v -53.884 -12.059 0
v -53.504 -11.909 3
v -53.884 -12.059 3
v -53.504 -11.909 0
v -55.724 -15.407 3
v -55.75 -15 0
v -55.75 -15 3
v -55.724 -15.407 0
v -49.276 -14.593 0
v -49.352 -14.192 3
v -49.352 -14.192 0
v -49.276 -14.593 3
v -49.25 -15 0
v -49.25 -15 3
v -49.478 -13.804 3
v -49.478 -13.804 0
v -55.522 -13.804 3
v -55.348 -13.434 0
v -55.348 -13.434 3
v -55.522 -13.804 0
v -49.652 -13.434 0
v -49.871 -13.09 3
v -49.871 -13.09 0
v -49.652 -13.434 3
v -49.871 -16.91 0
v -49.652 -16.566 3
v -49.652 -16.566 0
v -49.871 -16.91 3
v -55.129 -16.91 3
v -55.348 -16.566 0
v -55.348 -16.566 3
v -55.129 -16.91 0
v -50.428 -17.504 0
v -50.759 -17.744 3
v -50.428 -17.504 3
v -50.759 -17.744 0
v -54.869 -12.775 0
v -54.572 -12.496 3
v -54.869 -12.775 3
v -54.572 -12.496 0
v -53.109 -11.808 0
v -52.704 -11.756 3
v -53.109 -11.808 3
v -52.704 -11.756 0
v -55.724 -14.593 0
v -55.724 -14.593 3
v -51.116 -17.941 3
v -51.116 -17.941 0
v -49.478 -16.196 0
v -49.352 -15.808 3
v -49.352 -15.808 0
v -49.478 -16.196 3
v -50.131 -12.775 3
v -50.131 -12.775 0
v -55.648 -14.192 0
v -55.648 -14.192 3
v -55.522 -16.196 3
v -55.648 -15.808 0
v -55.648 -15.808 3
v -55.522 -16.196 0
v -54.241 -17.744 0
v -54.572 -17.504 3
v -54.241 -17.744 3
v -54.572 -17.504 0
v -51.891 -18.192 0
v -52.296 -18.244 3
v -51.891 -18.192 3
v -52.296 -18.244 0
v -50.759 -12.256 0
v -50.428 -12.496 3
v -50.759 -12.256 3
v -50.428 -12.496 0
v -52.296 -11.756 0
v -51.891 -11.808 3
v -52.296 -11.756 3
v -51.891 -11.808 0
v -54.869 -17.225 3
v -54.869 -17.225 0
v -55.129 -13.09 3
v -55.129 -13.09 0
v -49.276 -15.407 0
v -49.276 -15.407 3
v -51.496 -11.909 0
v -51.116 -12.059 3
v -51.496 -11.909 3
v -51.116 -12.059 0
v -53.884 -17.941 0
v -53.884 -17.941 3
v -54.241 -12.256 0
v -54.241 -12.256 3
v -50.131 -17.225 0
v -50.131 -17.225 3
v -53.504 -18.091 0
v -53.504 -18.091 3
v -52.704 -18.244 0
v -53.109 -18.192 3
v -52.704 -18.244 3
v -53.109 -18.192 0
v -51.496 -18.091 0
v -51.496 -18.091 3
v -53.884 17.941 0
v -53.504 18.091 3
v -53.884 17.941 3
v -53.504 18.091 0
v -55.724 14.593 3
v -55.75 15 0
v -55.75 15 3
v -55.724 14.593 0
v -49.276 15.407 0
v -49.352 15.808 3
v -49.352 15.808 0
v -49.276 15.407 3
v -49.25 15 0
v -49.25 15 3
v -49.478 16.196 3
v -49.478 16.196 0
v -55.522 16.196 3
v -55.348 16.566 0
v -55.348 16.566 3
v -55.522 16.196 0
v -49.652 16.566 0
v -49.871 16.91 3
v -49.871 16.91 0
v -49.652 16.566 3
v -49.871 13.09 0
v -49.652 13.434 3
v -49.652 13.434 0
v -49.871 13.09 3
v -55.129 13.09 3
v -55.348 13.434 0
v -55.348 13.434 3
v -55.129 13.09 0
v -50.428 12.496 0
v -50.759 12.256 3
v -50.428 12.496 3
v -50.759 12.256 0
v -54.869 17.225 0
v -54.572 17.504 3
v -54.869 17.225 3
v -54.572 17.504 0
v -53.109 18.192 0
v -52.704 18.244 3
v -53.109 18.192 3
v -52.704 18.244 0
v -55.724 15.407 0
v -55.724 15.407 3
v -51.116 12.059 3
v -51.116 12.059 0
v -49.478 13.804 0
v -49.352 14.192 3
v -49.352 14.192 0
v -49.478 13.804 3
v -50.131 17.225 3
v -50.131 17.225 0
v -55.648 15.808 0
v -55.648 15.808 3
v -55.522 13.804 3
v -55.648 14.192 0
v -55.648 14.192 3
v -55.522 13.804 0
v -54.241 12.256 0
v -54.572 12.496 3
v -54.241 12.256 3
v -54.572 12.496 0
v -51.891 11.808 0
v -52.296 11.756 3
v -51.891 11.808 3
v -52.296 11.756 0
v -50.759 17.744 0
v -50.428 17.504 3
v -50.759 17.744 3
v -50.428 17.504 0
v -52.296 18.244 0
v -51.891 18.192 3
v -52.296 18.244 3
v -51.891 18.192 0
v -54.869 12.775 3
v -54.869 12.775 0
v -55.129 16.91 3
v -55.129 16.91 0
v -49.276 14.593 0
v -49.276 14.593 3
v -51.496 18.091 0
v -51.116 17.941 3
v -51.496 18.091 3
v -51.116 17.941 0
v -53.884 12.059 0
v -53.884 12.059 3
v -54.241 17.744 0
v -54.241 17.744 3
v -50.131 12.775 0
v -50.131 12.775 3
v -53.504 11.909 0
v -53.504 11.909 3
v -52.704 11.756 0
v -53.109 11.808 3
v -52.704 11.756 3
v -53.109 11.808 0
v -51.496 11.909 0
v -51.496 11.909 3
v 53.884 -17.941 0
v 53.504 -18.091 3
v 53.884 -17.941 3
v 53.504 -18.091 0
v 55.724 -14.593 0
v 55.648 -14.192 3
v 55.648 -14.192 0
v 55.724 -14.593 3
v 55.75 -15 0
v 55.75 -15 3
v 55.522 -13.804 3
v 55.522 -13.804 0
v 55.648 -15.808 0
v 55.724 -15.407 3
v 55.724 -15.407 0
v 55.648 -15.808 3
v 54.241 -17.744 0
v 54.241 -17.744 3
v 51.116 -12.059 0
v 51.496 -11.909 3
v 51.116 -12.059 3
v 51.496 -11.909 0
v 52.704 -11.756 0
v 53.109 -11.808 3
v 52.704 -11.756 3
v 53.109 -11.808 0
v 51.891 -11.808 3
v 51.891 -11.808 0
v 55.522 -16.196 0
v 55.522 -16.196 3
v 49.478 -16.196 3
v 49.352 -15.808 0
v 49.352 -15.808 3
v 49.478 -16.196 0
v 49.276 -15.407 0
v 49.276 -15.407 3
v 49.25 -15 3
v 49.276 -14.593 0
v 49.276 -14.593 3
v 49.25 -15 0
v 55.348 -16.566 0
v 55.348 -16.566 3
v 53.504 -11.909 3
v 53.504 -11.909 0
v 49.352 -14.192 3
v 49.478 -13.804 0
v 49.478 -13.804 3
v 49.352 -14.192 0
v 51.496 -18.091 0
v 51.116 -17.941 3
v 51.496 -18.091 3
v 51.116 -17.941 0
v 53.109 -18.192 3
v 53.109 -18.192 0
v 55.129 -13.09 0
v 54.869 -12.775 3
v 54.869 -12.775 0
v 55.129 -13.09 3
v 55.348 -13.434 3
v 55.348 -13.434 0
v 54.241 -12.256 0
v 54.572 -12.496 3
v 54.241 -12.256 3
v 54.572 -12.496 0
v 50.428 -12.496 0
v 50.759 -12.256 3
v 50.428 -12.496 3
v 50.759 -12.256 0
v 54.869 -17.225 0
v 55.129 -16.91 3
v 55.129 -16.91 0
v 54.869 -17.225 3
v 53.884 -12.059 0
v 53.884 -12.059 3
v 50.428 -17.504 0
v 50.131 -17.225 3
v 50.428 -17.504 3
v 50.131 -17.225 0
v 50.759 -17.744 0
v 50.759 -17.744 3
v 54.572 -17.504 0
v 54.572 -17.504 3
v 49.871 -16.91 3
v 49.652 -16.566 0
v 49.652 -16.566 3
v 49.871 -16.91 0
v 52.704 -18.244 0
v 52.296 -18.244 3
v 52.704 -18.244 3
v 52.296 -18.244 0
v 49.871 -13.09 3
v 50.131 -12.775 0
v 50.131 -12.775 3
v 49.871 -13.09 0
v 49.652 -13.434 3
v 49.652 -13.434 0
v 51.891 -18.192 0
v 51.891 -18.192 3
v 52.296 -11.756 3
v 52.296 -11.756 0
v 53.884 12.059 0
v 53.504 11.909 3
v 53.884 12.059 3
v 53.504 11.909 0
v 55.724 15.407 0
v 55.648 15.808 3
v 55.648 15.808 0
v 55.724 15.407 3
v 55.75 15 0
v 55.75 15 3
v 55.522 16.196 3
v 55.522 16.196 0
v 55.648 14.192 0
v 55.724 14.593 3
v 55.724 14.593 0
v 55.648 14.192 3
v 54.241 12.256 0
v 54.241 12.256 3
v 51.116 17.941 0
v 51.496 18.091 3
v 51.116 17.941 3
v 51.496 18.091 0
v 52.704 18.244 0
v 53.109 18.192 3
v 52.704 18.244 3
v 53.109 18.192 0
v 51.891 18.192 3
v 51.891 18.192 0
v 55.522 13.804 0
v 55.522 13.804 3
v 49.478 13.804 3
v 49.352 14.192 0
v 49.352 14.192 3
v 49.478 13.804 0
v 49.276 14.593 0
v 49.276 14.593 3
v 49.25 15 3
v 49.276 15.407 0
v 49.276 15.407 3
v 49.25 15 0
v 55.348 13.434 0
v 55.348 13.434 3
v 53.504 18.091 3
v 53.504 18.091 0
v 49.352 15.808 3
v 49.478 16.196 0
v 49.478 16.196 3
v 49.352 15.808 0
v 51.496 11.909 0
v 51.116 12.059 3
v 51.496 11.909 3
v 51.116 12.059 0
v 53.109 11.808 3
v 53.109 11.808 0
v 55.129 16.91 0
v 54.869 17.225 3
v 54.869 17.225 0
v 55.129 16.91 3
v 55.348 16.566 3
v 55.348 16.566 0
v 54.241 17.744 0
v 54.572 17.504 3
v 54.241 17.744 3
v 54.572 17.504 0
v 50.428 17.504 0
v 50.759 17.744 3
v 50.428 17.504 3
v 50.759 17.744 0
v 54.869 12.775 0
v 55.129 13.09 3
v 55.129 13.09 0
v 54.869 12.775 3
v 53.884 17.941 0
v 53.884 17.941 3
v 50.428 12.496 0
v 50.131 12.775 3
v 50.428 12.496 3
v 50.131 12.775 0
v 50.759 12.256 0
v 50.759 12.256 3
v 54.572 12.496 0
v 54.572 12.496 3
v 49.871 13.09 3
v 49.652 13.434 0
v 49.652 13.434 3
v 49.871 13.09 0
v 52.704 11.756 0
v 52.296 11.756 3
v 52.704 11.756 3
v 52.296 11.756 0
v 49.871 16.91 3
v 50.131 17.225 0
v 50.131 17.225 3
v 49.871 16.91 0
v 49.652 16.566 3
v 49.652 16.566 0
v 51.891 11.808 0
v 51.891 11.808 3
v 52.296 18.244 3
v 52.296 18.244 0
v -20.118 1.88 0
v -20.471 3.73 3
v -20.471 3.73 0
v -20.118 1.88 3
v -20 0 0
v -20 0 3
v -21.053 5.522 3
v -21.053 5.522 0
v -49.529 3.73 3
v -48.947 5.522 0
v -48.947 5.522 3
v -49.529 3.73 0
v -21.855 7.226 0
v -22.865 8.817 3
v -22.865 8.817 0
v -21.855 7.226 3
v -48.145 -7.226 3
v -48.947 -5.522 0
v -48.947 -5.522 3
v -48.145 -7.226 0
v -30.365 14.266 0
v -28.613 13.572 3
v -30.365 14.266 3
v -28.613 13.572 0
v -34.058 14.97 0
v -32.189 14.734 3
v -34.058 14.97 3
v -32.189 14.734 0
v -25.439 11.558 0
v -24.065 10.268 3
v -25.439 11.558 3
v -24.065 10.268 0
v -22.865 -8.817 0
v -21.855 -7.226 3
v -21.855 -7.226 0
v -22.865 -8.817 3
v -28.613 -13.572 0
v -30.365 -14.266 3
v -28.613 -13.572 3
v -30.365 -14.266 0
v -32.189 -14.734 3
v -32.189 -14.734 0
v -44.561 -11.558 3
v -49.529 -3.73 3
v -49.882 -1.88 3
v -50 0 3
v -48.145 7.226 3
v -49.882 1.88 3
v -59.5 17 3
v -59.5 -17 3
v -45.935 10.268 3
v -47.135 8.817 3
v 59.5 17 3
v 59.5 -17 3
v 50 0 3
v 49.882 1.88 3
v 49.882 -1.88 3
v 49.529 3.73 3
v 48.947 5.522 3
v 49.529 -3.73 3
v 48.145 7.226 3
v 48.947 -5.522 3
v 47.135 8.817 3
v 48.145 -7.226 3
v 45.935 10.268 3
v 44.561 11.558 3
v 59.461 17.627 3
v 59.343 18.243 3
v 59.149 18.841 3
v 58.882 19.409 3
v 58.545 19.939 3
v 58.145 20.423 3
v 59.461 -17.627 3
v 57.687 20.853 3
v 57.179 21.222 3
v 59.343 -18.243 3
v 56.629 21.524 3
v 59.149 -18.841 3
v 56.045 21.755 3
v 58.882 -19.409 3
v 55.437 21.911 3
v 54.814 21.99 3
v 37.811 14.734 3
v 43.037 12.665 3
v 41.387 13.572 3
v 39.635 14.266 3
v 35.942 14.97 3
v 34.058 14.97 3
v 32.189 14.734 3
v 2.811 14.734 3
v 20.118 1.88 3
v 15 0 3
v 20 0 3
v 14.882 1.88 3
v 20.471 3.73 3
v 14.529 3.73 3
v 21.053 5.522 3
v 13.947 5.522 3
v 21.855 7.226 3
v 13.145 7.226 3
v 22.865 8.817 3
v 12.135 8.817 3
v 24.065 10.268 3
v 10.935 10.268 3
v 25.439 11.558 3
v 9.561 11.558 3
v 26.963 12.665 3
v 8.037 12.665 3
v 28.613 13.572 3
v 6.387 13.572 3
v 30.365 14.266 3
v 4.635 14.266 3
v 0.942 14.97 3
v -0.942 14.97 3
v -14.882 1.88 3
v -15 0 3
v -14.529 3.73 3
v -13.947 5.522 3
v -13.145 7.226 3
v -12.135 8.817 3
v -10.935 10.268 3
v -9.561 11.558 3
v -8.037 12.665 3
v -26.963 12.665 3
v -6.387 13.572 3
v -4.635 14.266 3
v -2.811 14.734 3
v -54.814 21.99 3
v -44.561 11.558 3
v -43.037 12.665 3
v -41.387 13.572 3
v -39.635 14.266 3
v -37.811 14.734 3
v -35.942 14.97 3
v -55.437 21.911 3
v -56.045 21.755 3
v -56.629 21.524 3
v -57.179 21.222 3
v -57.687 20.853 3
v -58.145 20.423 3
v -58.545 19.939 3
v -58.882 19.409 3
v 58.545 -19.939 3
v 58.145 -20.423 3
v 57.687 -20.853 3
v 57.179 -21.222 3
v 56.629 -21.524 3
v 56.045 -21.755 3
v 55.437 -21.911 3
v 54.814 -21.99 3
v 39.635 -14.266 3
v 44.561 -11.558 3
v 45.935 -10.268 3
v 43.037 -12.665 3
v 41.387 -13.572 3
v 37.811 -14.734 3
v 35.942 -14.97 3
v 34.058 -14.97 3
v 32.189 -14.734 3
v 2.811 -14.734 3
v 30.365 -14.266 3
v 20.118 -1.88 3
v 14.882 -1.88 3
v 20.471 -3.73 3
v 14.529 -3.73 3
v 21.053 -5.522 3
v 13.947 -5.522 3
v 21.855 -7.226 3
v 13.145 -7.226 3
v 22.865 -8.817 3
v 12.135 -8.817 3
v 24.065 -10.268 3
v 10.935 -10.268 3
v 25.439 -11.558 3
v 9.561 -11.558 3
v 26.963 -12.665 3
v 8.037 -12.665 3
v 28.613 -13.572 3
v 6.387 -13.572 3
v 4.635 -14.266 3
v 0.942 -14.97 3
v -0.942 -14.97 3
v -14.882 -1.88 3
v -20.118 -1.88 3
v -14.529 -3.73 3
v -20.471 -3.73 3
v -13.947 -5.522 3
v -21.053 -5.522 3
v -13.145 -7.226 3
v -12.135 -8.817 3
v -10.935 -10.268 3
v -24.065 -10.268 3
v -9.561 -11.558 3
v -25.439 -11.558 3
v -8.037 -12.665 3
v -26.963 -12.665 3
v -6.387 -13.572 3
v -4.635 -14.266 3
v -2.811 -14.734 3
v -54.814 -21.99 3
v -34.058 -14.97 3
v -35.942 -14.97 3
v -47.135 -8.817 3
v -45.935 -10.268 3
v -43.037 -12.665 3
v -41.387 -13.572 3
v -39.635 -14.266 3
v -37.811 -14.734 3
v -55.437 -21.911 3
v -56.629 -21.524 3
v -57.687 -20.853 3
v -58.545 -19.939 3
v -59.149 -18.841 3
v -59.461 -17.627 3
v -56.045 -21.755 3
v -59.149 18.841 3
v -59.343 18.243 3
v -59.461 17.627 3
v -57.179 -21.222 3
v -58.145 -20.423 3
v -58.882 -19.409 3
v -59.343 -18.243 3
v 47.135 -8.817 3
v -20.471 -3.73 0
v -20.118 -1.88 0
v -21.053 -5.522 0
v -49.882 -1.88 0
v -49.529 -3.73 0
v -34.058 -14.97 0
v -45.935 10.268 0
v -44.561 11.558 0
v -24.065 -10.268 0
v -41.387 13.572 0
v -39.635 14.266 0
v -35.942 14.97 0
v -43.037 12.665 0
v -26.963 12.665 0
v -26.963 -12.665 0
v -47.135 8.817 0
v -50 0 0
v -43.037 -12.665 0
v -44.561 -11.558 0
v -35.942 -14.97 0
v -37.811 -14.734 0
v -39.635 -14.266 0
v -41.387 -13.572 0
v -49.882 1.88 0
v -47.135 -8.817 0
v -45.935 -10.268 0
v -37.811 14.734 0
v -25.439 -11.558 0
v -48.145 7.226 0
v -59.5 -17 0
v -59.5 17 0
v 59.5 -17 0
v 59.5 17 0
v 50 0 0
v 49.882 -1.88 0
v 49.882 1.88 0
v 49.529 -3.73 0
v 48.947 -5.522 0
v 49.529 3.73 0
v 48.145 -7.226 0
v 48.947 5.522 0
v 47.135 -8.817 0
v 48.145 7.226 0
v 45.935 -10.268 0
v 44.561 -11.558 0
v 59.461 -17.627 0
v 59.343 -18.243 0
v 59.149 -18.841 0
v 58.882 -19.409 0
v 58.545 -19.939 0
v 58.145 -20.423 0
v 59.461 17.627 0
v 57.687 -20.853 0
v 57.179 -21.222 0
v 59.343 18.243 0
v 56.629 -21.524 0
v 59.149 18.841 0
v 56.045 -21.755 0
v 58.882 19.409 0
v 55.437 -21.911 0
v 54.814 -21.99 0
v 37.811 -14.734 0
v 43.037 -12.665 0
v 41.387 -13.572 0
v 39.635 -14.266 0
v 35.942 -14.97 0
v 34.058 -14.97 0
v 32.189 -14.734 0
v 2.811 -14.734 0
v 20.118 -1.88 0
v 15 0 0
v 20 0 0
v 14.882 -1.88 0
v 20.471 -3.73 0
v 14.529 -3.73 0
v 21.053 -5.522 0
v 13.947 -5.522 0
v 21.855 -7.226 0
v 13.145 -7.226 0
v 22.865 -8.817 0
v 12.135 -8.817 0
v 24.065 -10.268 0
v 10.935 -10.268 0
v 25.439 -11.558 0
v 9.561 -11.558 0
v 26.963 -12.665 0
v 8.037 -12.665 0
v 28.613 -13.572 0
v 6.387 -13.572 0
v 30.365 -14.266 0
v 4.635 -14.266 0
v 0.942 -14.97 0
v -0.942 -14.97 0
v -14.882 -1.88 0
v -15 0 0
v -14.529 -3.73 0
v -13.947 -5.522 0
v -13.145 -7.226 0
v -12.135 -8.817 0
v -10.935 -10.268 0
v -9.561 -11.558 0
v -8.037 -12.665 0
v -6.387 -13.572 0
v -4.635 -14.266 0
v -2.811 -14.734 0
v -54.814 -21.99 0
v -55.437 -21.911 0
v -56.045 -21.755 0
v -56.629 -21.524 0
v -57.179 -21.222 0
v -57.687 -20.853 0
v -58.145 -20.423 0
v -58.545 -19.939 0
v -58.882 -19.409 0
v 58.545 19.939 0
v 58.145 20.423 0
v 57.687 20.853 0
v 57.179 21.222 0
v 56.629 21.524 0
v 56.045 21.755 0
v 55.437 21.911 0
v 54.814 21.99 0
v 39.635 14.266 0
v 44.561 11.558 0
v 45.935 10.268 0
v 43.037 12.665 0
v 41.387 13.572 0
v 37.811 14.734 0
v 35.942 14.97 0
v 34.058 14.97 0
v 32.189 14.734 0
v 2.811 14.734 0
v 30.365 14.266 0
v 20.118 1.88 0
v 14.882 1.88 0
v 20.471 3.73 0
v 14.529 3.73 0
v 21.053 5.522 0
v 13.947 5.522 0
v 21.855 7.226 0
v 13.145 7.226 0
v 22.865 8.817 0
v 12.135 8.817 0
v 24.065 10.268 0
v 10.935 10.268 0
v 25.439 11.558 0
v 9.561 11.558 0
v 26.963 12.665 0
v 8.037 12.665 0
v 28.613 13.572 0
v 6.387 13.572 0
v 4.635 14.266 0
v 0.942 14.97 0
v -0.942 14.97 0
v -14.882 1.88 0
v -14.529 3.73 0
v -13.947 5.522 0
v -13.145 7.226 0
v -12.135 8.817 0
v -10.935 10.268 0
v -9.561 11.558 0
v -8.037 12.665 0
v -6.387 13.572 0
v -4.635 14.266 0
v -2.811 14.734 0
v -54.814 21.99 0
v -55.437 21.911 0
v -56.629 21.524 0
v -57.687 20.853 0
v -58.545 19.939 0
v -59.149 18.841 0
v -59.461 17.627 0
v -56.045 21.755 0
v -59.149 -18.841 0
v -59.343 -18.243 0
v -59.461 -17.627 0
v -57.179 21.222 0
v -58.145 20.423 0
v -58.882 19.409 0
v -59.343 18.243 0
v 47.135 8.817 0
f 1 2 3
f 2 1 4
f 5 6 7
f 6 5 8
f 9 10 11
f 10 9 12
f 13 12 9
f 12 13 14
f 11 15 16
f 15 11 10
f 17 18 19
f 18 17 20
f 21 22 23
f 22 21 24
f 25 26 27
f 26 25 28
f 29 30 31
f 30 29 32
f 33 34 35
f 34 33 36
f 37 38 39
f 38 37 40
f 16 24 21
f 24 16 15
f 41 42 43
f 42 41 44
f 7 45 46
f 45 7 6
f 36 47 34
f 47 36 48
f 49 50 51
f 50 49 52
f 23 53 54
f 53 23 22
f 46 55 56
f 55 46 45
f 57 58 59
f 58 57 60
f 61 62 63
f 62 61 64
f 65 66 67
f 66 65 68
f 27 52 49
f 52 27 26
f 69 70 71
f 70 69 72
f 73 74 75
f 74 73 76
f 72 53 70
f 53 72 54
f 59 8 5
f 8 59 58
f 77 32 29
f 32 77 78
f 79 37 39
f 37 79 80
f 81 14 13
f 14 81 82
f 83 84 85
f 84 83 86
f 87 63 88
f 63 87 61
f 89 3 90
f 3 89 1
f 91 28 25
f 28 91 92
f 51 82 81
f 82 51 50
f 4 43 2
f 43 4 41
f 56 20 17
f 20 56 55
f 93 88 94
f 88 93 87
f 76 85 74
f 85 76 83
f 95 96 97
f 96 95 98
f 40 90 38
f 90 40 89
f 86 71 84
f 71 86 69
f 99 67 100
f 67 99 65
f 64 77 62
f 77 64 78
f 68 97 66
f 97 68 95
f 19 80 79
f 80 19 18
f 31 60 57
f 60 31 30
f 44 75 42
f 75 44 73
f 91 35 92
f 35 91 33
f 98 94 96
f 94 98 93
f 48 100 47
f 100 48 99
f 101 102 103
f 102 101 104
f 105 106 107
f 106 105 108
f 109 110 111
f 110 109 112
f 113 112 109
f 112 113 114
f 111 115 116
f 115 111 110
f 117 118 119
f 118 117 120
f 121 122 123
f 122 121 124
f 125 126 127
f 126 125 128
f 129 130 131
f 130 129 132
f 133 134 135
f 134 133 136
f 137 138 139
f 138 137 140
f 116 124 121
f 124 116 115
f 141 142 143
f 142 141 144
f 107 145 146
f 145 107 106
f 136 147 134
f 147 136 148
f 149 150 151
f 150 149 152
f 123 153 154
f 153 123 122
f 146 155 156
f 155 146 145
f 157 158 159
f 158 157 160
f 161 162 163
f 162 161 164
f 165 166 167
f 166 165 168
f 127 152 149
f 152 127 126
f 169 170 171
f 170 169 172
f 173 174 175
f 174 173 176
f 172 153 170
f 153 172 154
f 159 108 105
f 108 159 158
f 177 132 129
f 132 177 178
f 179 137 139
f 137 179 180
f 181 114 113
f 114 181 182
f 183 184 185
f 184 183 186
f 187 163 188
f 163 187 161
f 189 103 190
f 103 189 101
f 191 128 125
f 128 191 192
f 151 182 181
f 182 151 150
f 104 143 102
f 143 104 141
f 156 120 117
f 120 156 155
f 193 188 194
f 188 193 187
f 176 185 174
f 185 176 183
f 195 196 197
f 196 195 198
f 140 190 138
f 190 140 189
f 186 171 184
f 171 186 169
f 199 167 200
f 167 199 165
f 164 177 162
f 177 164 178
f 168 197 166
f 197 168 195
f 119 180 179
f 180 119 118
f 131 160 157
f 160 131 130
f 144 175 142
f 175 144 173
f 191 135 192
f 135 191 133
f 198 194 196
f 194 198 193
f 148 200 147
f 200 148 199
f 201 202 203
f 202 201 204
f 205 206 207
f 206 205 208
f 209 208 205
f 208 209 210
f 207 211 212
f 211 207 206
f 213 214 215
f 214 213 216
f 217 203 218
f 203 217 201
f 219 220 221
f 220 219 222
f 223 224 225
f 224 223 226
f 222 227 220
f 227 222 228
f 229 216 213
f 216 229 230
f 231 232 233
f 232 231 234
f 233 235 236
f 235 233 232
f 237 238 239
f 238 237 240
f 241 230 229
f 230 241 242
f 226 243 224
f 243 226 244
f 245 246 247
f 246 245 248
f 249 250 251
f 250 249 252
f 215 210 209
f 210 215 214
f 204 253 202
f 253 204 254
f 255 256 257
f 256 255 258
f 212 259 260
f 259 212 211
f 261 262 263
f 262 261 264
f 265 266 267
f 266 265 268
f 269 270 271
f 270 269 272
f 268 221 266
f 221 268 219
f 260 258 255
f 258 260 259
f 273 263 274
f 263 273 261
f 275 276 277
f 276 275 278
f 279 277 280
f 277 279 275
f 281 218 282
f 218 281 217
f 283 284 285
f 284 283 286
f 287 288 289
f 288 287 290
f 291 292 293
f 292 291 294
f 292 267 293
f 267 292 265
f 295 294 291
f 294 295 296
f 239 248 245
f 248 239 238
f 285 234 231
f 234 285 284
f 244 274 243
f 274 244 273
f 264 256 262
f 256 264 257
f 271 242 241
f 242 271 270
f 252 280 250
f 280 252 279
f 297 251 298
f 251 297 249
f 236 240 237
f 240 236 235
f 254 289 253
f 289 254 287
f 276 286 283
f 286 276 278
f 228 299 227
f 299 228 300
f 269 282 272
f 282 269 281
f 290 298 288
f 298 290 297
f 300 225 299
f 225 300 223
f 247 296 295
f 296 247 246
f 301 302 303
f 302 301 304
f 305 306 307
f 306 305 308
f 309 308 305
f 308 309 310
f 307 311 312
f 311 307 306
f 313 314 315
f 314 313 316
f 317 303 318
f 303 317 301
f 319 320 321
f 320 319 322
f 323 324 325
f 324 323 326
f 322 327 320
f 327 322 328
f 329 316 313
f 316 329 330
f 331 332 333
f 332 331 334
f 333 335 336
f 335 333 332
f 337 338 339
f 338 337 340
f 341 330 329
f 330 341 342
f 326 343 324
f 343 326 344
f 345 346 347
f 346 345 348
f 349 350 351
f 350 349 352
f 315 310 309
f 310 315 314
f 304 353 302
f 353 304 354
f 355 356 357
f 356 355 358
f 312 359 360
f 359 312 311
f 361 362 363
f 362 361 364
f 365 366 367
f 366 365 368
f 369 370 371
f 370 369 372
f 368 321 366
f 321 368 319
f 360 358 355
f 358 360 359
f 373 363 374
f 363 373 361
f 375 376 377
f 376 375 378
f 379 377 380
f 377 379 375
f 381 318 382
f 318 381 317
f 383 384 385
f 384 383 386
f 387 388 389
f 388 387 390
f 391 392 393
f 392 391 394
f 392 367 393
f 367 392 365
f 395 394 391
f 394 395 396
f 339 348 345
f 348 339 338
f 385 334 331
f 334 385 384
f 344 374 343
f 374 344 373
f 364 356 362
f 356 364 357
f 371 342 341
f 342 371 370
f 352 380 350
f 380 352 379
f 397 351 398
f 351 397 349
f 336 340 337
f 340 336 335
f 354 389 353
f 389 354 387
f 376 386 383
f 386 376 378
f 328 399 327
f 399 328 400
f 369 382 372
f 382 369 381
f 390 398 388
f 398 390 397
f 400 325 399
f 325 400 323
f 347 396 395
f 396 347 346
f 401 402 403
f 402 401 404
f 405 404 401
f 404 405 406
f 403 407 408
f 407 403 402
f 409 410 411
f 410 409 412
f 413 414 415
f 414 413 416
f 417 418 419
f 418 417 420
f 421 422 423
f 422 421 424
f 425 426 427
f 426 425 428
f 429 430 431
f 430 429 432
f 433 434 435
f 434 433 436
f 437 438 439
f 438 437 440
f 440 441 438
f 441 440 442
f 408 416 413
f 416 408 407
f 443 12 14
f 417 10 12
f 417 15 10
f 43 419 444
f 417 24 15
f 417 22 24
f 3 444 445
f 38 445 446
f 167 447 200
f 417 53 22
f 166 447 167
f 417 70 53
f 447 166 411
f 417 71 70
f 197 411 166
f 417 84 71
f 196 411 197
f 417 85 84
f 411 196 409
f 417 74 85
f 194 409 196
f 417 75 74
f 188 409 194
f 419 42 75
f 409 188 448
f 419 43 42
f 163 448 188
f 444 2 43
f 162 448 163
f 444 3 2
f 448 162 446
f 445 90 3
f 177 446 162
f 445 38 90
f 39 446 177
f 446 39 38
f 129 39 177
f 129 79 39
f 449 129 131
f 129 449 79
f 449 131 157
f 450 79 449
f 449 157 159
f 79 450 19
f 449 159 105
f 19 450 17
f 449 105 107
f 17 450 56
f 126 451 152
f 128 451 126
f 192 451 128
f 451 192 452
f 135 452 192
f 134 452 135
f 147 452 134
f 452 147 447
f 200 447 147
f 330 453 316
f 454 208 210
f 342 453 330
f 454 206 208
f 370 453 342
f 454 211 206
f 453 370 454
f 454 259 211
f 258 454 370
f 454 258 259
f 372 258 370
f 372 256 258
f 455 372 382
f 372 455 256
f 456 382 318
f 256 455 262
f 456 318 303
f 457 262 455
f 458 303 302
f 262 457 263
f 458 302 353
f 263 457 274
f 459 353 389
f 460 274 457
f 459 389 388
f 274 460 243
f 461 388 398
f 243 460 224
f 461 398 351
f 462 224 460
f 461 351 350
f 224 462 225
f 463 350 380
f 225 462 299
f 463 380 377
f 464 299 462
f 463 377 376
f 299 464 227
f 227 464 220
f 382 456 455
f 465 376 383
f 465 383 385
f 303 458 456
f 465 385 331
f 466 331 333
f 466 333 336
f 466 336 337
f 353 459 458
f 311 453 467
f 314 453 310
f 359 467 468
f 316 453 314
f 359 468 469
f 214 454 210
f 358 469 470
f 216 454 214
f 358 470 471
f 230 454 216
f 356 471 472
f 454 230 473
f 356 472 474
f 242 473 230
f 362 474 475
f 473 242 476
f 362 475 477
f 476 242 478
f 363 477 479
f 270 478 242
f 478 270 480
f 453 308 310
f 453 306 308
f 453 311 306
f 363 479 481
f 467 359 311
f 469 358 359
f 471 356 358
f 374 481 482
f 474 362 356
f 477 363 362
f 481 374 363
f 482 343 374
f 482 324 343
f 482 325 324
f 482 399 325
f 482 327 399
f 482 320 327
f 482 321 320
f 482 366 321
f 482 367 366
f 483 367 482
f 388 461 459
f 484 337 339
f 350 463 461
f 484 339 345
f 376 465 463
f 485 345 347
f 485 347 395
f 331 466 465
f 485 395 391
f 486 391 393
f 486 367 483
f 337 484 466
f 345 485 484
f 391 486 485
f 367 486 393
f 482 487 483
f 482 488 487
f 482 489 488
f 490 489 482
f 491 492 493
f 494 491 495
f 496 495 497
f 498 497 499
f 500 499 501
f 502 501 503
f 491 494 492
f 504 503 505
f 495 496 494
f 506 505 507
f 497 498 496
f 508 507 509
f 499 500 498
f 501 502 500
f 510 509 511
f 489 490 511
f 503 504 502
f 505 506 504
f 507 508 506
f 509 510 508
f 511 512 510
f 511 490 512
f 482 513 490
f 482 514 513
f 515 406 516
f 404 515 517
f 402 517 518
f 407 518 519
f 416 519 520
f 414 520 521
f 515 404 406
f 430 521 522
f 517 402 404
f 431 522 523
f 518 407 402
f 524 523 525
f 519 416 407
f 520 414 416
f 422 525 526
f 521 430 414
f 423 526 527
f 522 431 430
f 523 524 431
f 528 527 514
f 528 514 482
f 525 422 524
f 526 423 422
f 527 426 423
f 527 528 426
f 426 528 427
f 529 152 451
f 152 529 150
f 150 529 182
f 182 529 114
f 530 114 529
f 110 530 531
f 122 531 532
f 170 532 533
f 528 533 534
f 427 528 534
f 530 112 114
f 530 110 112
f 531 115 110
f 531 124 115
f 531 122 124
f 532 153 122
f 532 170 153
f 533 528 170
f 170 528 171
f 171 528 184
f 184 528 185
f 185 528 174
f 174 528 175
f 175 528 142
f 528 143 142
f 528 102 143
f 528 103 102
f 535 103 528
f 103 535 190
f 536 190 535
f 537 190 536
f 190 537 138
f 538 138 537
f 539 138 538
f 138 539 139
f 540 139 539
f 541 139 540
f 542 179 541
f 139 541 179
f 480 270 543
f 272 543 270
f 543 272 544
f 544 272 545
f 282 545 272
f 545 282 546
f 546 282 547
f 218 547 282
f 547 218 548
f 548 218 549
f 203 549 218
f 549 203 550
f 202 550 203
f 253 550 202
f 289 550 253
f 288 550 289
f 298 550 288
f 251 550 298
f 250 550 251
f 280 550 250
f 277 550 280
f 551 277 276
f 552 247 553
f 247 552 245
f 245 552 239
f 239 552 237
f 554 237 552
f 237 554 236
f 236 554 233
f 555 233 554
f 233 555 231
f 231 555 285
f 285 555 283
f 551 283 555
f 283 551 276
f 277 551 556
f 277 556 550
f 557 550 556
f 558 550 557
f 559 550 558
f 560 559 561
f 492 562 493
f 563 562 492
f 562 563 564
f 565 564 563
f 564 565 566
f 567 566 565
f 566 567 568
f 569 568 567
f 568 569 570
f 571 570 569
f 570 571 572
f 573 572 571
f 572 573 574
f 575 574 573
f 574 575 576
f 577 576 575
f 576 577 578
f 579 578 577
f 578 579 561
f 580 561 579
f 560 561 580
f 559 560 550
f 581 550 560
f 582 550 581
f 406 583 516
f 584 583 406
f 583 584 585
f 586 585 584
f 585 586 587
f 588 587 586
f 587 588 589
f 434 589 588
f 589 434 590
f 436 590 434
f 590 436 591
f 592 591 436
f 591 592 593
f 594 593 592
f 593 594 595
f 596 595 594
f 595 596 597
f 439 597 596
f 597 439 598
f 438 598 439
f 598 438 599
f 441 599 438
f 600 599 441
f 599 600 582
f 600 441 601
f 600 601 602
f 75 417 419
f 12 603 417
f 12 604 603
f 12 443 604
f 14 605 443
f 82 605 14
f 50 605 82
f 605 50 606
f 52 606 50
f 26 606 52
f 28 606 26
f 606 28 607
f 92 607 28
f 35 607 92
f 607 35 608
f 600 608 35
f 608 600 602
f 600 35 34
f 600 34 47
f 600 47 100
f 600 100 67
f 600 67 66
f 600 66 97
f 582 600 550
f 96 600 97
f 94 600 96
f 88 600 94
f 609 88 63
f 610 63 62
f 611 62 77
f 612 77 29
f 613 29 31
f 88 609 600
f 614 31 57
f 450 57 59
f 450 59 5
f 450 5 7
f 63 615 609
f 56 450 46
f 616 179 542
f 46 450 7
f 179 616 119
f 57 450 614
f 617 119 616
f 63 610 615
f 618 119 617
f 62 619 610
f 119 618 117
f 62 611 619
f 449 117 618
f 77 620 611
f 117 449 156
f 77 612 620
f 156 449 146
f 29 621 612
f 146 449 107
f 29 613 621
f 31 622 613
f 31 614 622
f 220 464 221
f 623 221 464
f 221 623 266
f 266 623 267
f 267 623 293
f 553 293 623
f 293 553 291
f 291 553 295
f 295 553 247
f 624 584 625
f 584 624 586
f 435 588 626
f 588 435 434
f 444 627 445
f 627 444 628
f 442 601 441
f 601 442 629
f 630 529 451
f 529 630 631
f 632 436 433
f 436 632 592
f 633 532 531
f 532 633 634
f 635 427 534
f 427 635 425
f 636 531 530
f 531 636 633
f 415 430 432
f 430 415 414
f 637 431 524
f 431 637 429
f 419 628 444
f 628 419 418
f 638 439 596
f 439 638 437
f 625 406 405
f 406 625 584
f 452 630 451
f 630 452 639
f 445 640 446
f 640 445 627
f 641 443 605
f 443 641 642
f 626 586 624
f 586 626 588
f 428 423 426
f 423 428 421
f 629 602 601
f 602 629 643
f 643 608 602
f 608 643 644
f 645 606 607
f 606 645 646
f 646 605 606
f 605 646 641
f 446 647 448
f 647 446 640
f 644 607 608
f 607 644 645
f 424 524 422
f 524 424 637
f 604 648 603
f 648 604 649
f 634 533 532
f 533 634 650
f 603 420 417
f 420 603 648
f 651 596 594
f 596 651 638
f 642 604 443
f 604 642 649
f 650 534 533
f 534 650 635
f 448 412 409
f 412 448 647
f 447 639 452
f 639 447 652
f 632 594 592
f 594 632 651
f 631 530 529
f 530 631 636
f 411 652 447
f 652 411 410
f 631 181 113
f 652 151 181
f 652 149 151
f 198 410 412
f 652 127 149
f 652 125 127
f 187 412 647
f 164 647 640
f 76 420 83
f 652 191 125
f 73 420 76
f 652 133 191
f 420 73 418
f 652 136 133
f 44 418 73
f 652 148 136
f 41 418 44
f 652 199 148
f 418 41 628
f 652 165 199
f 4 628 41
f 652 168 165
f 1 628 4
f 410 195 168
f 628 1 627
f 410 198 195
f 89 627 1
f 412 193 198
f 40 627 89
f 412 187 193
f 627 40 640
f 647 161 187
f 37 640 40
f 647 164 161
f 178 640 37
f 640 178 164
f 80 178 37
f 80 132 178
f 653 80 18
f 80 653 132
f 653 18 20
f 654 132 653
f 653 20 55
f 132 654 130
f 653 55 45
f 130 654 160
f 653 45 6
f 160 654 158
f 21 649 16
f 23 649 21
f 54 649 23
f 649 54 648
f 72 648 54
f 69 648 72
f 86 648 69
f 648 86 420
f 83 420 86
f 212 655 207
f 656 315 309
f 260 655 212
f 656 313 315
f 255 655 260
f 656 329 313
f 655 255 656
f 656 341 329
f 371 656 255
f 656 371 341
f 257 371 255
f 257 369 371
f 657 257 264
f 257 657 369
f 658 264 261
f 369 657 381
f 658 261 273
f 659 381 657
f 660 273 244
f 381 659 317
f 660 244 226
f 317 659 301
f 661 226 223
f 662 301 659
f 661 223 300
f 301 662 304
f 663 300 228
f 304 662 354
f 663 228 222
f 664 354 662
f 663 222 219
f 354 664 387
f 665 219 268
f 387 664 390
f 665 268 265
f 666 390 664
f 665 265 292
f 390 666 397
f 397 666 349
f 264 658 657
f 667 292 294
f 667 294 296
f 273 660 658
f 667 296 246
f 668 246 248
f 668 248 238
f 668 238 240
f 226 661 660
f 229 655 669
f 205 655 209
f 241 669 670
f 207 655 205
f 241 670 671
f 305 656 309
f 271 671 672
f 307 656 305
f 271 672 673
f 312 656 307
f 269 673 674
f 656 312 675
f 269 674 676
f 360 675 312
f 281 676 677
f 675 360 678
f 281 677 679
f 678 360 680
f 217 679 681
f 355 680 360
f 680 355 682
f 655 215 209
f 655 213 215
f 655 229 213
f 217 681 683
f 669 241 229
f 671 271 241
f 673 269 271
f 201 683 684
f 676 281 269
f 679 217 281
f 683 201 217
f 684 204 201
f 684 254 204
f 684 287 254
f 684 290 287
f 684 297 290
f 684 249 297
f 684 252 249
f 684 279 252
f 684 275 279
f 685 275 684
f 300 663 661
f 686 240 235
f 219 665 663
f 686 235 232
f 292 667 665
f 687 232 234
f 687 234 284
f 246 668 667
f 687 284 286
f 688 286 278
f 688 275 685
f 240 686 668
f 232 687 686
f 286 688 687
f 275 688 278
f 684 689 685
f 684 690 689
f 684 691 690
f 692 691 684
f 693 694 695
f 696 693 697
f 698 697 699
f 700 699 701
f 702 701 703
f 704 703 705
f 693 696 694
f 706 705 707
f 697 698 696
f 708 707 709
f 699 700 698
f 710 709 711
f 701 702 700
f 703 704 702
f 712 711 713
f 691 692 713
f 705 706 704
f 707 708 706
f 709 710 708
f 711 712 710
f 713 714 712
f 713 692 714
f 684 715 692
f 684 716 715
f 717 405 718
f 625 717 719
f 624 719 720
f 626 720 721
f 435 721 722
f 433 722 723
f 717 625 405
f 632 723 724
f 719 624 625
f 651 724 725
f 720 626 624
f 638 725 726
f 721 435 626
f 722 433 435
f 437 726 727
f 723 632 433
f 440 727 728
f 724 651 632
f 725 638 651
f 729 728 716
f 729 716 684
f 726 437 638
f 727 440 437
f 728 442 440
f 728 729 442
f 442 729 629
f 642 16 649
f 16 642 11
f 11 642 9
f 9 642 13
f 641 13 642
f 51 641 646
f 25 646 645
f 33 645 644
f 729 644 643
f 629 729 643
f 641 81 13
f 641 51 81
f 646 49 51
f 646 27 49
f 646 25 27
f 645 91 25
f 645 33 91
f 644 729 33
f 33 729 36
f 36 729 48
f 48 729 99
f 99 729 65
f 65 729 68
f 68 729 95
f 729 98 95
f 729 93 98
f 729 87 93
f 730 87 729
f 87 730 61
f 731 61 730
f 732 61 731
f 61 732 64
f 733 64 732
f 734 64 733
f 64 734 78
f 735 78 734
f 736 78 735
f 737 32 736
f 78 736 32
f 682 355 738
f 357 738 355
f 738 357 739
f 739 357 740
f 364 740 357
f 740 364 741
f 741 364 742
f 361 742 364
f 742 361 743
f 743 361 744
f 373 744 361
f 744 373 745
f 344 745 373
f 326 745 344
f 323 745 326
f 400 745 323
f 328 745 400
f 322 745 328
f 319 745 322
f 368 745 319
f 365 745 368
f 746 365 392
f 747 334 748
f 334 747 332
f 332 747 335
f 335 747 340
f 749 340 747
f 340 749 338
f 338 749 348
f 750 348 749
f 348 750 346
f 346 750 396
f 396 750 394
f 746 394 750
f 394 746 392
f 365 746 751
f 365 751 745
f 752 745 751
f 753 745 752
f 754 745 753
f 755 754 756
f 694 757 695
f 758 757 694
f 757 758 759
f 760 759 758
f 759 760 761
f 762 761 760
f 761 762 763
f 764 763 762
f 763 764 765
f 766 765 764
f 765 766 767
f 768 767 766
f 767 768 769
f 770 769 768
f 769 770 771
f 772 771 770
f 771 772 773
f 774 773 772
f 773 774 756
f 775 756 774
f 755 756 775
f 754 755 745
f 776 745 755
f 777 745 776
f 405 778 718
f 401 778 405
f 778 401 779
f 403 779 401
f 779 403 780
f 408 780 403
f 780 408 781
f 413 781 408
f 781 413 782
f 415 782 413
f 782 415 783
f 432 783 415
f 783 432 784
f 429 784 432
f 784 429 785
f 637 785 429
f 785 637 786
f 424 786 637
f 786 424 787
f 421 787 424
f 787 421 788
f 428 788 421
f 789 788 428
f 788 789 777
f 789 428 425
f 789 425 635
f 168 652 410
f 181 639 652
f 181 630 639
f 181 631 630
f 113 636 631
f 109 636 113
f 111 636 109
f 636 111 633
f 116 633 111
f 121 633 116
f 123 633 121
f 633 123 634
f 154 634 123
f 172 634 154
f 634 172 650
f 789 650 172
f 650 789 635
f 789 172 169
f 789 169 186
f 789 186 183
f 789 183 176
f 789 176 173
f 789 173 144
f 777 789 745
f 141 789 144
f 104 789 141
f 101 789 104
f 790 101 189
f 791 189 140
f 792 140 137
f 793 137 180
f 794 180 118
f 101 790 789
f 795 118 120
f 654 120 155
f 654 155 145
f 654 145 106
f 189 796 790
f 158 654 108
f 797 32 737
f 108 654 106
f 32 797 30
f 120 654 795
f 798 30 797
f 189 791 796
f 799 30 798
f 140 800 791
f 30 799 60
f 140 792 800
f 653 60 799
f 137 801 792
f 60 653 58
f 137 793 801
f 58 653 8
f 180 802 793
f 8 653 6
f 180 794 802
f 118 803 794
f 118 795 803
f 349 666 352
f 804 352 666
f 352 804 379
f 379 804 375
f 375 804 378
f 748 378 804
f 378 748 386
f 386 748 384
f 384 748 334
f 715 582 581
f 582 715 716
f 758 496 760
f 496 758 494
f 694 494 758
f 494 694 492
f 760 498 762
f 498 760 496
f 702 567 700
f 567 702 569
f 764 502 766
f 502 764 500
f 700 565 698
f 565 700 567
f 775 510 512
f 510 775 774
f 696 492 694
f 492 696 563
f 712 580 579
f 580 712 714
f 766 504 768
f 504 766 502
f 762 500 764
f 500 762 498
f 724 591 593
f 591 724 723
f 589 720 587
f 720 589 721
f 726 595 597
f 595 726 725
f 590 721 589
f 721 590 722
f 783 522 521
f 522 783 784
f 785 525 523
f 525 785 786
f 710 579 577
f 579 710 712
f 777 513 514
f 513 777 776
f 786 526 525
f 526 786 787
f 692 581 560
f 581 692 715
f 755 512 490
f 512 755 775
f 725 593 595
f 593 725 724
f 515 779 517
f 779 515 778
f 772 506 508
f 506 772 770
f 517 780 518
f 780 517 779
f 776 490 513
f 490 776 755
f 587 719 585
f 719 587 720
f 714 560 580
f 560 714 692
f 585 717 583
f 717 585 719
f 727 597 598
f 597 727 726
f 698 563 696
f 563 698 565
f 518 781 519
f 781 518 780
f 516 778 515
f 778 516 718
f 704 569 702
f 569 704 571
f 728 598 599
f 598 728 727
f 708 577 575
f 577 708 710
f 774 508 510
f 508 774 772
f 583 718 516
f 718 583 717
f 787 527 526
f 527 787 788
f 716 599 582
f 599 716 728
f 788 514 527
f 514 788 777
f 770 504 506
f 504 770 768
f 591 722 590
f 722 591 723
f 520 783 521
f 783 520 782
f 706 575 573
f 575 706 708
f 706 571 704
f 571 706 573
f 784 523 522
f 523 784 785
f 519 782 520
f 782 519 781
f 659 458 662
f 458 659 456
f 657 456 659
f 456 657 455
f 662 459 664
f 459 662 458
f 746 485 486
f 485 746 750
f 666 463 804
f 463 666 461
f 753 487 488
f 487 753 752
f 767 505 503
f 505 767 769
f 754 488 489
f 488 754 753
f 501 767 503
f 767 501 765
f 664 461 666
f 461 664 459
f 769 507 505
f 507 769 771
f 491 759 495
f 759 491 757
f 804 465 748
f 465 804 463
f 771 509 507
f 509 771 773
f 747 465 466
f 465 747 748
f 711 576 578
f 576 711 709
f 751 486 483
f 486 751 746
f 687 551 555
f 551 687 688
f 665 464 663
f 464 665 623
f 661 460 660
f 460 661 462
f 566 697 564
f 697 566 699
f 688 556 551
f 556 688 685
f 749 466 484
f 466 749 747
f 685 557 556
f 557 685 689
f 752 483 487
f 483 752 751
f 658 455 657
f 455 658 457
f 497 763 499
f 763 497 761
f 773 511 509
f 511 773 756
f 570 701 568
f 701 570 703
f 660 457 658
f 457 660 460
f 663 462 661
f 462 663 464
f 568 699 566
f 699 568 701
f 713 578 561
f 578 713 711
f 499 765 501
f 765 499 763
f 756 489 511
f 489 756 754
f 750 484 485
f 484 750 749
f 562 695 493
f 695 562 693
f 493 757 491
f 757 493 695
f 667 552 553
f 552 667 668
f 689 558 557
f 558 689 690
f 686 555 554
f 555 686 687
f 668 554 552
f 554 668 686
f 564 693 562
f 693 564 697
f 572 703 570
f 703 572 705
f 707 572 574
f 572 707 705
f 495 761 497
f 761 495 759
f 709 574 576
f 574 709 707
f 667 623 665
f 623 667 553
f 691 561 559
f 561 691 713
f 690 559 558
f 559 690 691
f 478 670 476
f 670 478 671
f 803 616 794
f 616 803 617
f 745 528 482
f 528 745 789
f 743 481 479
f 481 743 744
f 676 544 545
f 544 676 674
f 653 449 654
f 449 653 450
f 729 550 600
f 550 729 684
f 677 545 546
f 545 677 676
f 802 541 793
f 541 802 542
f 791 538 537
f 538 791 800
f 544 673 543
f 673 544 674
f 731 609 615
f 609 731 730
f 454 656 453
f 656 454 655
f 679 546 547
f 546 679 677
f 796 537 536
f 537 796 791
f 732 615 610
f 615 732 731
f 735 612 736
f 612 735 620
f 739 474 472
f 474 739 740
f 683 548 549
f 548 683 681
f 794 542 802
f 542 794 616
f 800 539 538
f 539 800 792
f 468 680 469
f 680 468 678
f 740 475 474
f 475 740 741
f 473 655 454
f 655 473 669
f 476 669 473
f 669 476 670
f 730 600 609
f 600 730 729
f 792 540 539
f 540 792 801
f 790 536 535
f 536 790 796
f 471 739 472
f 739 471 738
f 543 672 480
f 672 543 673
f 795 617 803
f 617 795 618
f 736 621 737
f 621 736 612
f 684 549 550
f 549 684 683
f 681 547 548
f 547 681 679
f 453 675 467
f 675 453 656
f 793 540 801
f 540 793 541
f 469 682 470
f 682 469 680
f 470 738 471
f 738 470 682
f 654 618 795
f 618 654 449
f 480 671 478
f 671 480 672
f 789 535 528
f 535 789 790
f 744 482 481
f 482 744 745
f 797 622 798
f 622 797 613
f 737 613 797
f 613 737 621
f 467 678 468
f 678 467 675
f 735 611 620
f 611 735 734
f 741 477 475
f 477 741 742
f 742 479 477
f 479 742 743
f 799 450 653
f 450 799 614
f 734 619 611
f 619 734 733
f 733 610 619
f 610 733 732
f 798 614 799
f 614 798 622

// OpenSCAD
$fn = 50;


difference() {
	union() {
		hull() {
			translate(v = [-54.5000000000, 17.0000000000, 0]) {
				cylinder(h = 3, r = 5);
			}
			translate(v = [54.5000000000, 17.0000000000, 0]) {
				cylinder(h = 3, r = 5);
			}
			translate(v = [-54.5000000000, -17.0000000000, 0]) {
				cylinder(h = 3, r = 5);
			}
			translate(v = [54.5000000000, -17.0000000000, 0]) {
				cylinder(h = 3, r = 5);
			}
		}
	}
	union() {
		#translate(v = [-52.5000000000, -15.0000000000, -100.0000000000]) {
			cylinder(h = 200, r = 3.2500000000);
		}
		#translate(v = [-52.5000000000, 15.0000000000, -100.0000000000]) {
			cylinder(h = 200, r = 3.2500000000);
		}
		#translate(v = [52.5000000000, -15.0000000000, -100.0000000000]) {
			cylinder(h = 200, r = 3.2500000000);
		}
		#translate(v = [52.5000000000, 15.0000000000, -100.0000000000]) {
			cylinder(h = 200, r = 3.2500000000);
		}
		#translate(v = [-35.0000000000, 0, 0]) {
			cylinder(h = 3, r = 15.0000000000);
		}
		#cylinder(h = 3, r = 15.0000000000);
		#translate(v = [35.0000000000, 0, 0]) {
			cylinder(h = 3, r = 15.0000000000);
		}
	}
}
